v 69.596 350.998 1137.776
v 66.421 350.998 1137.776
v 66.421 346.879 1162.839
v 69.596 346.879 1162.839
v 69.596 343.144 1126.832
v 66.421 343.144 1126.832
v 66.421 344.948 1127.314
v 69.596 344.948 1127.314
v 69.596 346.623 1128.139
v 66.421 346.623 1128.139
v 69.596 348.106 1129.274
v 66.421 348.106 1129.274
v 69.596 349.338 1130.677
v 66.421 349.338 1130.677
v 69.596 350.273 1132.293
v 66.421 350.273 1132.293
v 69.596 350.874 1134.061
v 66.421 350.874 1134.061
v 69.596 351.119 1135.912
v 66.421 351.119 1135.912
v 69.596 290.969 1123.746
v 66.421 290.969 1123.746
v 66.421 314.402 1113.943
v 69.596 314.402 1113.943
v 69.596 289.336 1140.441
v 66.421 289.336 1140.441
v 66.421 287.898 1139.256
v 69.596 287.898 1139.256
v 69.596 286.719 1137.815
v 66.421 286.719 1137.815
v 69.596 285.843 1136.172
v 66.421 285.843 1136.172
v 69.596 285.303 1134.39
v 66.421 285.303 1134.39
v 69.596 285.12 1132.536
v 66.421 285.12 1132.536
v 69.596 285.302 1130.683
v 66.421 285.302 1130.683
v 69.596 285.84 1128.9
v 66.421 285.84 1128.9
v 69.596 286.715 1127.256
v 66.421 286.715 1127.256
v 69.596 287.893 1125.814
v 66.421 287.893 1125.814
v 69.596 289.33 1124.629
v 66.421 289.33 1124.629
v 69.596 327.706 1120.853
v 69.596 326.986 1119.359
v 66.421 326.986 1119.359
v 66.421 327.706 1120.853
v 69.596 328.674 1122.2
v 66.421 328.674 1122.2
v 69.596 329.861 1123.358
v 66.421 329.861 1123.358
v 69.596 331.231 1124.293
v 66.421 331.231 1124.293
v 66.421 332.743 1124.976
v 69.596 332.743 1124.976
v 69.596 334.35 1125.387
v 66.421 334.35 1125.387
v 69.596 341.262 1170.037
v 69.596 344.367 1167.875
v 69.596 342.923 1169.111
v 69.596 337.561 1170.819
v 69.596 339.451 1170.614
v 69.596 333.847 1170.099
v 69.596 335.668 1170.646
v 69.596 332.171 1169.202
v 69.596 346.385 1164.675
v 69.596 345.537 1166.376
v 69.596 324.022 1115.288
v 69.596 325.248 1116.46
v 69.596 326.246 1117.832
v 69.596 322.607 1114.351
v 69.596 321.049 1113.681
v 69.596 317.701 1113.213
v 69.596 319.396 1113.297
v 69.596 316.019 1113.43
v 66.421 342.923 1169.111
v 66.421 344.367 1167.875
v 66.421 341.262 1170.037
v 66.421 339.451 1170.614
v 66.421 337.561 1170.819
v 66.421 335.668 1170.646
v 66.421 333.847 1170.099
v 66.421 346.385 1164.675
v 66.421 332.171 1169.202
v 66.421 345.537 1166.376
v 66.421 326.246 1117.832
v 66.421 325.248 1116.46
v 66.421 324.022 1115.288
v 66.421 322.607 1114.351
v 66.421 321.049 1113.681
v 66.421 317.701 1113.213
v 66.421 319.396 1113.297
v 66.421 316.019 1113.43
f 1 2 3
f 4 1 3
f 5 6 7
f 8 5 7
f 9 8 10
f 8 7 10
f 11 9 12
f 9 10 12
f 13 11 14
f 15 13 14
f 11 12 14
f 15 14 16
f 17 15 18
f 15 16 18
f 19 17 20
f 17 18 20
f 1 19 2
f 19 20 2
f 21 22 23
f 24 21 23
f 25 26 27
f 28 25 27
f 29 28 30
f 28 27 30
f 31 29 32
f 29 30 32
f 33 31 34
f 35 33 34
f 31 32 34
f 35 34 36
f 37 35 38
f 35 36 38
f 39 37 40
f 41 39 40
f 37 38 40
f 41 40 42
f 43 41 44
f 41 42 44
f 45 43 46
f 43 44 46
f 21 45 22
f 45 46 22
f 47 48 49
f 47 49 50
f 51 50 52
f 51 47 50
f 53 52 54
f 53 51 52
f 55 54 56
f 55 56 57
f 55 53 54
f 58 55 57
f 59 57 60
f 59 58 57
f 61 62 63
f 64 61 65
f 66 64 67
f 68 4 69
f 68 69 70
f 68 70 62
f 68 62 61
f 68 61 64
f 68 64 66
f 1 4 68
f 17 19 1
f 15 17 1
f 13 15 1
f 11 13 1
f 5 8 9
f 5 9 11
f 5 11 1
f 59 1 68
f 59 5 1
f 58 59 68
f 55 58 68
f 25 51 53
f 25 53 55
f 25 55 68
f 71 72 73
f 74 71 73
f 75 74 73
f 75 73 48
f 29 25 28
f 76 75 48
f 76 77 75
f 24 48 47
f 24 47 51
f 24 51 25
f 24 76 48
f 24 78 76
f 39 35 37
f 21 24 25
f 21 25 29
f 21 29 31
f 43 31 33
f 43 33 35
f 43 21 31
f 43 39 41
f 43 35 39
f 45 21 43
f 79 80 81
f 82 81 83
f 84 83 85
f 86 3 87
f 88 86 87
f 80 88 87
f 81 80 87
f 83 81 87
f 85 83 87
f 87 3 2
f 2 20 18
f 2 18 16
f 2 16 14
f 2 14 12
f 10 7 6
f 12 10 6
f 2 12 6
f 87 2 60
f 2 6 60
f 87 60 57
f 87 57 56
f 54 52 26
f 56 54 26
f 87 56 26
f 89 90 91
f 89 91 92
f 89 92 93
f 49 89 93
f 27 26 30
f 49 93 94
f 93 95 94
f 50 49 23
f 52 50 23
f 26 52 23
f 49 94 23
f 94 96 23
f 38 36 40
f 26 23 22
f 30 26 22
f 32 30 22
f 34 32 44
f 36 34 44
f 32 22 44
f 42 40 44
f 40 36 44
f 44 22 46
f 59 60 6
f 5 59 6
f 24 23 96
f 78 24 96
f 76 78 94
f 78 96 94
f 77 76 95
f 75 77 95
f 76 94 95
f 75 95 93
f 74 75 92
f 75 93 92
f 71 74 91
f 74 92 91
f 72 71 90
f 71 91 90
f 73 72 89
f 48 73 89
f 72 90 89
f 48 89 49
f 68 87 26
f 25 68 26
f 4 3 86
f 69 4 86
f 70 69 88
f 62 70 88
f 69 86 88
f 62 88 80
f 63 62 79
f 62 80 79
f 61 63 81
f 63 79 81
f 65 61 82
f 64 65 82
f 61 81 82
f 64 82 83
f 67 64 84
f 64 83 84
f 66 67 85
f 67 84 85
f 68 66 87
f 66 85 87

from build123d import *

# Parameters (mm, degrees)
BOSS_EXTRUDE1_START = 66.421062
BOSS_EXTRUDE1_DEPTH = 3.175
FILLET1_R           = 9.525


with BuildPart() as part:
    # Sketch1 → Boss-Extrude1 (new body)
    with BuildSketch(Plane(origin=(0, 0, 0), x_dir=(0, 0, -1), z_dir=(1, 0, 0)).offset(BOSS_EXTRUDE1_START)):
        with BuildLine():
            Line((-1123.745691864, 290.969312893), (-1113.943201538, 314.401580889))
            ThreePointArc((-1113.943201538, 314.401580889), (-1115.256946713, 323.982985548), (-1124.274989939, 327.476427692))
            Line((-1124.274989939, 327.476427692), (-1124.257483159, 327.479304887))
            Line((-1124.257483159, 327.479304887), (-1126.831962996, 343.144159772))
            ThreePointArc((-1126.831962996, 343.144159772), (-1130.677100149, 349.33776623), (-1137.77556383, 350.998384801))
            Line((-1137.77556383, 350.998384801), (-1162.839331646, 346.879217061))
            ThreePointArc((-1162.839331646, 346.879217061), (-1170.036672625, 341.262176157), (-1169.202400053, 332.170594614))
            Line((-1169.202400053, 332.170594614), (-1140.440548672, 289.335537249))
            ThreePointArc((-1140.440548672, 289.335537249), (-1131.605097766, 285.165531172), (-1123.745691864, 290.969312893))
        make_face()
    extrude(amount=BOSS_EXTRUDE1_DEPTH)

    # Fillet1
    # the kernel refuses this fillet: 9.525 mm, written as the material it adds along each edge
    with BuildSketch(Plane(origin=(66.421062, 327.476427692, 1124.274989939), x_dir=(0, -0.5830735725589627, -0.8124193553721674), z_dir=(1, 0, 0))) as fillet1_piece_1_section:
        with BuildLine():
            CenterArc((20.205576272, 6.735192091), FILLET1_R, 135, 90)
            Line((13.470384182, 13.470384182), (0, 0))
            ThreePointArc((0, 0), (6.735192091, 2.789807909), (13.470384182, 0))
        make_face()
    fillet1_piece_1 = extrude(amount=3.175, mode=Mode.PRIVATE)
    fillet1_piece_1 = split(fillet1_piece_1, bisect_by=Plane(origin=(68.008562, 327.479299996, 1124.257482355), z_dir=(0, -0.1621719582624188, 0.9867625124381917)), keep=Keep.TOP, mode=Mode.PRIVATE)
    add(fillet1_piece_1)
    # the kernel refuses this fillet: 9.525 mm, written as the material it adds along each edge
    with BuildSketch(Plane(origin=(69.596062, 327.479288583, 1124.257480479), x_dir=(0, 0.9867625124381958, 0.162171958262393), z_dir=(-1, 0, 0))) as fillet1_2_piece_1:
        with BuildLine():
            CenterArc((6.9625446, 9.525), FILLET1_R, 210.061634747, 59.938365253)
            ThreePointArc((-1.281219438, 4.753629183), (-0.328171819, 2.461024254), (0, 0))
            Line((0, 0), (6.9625446, 0))
        make_face()
    extrude(amount=3.175)


solid = part.part
